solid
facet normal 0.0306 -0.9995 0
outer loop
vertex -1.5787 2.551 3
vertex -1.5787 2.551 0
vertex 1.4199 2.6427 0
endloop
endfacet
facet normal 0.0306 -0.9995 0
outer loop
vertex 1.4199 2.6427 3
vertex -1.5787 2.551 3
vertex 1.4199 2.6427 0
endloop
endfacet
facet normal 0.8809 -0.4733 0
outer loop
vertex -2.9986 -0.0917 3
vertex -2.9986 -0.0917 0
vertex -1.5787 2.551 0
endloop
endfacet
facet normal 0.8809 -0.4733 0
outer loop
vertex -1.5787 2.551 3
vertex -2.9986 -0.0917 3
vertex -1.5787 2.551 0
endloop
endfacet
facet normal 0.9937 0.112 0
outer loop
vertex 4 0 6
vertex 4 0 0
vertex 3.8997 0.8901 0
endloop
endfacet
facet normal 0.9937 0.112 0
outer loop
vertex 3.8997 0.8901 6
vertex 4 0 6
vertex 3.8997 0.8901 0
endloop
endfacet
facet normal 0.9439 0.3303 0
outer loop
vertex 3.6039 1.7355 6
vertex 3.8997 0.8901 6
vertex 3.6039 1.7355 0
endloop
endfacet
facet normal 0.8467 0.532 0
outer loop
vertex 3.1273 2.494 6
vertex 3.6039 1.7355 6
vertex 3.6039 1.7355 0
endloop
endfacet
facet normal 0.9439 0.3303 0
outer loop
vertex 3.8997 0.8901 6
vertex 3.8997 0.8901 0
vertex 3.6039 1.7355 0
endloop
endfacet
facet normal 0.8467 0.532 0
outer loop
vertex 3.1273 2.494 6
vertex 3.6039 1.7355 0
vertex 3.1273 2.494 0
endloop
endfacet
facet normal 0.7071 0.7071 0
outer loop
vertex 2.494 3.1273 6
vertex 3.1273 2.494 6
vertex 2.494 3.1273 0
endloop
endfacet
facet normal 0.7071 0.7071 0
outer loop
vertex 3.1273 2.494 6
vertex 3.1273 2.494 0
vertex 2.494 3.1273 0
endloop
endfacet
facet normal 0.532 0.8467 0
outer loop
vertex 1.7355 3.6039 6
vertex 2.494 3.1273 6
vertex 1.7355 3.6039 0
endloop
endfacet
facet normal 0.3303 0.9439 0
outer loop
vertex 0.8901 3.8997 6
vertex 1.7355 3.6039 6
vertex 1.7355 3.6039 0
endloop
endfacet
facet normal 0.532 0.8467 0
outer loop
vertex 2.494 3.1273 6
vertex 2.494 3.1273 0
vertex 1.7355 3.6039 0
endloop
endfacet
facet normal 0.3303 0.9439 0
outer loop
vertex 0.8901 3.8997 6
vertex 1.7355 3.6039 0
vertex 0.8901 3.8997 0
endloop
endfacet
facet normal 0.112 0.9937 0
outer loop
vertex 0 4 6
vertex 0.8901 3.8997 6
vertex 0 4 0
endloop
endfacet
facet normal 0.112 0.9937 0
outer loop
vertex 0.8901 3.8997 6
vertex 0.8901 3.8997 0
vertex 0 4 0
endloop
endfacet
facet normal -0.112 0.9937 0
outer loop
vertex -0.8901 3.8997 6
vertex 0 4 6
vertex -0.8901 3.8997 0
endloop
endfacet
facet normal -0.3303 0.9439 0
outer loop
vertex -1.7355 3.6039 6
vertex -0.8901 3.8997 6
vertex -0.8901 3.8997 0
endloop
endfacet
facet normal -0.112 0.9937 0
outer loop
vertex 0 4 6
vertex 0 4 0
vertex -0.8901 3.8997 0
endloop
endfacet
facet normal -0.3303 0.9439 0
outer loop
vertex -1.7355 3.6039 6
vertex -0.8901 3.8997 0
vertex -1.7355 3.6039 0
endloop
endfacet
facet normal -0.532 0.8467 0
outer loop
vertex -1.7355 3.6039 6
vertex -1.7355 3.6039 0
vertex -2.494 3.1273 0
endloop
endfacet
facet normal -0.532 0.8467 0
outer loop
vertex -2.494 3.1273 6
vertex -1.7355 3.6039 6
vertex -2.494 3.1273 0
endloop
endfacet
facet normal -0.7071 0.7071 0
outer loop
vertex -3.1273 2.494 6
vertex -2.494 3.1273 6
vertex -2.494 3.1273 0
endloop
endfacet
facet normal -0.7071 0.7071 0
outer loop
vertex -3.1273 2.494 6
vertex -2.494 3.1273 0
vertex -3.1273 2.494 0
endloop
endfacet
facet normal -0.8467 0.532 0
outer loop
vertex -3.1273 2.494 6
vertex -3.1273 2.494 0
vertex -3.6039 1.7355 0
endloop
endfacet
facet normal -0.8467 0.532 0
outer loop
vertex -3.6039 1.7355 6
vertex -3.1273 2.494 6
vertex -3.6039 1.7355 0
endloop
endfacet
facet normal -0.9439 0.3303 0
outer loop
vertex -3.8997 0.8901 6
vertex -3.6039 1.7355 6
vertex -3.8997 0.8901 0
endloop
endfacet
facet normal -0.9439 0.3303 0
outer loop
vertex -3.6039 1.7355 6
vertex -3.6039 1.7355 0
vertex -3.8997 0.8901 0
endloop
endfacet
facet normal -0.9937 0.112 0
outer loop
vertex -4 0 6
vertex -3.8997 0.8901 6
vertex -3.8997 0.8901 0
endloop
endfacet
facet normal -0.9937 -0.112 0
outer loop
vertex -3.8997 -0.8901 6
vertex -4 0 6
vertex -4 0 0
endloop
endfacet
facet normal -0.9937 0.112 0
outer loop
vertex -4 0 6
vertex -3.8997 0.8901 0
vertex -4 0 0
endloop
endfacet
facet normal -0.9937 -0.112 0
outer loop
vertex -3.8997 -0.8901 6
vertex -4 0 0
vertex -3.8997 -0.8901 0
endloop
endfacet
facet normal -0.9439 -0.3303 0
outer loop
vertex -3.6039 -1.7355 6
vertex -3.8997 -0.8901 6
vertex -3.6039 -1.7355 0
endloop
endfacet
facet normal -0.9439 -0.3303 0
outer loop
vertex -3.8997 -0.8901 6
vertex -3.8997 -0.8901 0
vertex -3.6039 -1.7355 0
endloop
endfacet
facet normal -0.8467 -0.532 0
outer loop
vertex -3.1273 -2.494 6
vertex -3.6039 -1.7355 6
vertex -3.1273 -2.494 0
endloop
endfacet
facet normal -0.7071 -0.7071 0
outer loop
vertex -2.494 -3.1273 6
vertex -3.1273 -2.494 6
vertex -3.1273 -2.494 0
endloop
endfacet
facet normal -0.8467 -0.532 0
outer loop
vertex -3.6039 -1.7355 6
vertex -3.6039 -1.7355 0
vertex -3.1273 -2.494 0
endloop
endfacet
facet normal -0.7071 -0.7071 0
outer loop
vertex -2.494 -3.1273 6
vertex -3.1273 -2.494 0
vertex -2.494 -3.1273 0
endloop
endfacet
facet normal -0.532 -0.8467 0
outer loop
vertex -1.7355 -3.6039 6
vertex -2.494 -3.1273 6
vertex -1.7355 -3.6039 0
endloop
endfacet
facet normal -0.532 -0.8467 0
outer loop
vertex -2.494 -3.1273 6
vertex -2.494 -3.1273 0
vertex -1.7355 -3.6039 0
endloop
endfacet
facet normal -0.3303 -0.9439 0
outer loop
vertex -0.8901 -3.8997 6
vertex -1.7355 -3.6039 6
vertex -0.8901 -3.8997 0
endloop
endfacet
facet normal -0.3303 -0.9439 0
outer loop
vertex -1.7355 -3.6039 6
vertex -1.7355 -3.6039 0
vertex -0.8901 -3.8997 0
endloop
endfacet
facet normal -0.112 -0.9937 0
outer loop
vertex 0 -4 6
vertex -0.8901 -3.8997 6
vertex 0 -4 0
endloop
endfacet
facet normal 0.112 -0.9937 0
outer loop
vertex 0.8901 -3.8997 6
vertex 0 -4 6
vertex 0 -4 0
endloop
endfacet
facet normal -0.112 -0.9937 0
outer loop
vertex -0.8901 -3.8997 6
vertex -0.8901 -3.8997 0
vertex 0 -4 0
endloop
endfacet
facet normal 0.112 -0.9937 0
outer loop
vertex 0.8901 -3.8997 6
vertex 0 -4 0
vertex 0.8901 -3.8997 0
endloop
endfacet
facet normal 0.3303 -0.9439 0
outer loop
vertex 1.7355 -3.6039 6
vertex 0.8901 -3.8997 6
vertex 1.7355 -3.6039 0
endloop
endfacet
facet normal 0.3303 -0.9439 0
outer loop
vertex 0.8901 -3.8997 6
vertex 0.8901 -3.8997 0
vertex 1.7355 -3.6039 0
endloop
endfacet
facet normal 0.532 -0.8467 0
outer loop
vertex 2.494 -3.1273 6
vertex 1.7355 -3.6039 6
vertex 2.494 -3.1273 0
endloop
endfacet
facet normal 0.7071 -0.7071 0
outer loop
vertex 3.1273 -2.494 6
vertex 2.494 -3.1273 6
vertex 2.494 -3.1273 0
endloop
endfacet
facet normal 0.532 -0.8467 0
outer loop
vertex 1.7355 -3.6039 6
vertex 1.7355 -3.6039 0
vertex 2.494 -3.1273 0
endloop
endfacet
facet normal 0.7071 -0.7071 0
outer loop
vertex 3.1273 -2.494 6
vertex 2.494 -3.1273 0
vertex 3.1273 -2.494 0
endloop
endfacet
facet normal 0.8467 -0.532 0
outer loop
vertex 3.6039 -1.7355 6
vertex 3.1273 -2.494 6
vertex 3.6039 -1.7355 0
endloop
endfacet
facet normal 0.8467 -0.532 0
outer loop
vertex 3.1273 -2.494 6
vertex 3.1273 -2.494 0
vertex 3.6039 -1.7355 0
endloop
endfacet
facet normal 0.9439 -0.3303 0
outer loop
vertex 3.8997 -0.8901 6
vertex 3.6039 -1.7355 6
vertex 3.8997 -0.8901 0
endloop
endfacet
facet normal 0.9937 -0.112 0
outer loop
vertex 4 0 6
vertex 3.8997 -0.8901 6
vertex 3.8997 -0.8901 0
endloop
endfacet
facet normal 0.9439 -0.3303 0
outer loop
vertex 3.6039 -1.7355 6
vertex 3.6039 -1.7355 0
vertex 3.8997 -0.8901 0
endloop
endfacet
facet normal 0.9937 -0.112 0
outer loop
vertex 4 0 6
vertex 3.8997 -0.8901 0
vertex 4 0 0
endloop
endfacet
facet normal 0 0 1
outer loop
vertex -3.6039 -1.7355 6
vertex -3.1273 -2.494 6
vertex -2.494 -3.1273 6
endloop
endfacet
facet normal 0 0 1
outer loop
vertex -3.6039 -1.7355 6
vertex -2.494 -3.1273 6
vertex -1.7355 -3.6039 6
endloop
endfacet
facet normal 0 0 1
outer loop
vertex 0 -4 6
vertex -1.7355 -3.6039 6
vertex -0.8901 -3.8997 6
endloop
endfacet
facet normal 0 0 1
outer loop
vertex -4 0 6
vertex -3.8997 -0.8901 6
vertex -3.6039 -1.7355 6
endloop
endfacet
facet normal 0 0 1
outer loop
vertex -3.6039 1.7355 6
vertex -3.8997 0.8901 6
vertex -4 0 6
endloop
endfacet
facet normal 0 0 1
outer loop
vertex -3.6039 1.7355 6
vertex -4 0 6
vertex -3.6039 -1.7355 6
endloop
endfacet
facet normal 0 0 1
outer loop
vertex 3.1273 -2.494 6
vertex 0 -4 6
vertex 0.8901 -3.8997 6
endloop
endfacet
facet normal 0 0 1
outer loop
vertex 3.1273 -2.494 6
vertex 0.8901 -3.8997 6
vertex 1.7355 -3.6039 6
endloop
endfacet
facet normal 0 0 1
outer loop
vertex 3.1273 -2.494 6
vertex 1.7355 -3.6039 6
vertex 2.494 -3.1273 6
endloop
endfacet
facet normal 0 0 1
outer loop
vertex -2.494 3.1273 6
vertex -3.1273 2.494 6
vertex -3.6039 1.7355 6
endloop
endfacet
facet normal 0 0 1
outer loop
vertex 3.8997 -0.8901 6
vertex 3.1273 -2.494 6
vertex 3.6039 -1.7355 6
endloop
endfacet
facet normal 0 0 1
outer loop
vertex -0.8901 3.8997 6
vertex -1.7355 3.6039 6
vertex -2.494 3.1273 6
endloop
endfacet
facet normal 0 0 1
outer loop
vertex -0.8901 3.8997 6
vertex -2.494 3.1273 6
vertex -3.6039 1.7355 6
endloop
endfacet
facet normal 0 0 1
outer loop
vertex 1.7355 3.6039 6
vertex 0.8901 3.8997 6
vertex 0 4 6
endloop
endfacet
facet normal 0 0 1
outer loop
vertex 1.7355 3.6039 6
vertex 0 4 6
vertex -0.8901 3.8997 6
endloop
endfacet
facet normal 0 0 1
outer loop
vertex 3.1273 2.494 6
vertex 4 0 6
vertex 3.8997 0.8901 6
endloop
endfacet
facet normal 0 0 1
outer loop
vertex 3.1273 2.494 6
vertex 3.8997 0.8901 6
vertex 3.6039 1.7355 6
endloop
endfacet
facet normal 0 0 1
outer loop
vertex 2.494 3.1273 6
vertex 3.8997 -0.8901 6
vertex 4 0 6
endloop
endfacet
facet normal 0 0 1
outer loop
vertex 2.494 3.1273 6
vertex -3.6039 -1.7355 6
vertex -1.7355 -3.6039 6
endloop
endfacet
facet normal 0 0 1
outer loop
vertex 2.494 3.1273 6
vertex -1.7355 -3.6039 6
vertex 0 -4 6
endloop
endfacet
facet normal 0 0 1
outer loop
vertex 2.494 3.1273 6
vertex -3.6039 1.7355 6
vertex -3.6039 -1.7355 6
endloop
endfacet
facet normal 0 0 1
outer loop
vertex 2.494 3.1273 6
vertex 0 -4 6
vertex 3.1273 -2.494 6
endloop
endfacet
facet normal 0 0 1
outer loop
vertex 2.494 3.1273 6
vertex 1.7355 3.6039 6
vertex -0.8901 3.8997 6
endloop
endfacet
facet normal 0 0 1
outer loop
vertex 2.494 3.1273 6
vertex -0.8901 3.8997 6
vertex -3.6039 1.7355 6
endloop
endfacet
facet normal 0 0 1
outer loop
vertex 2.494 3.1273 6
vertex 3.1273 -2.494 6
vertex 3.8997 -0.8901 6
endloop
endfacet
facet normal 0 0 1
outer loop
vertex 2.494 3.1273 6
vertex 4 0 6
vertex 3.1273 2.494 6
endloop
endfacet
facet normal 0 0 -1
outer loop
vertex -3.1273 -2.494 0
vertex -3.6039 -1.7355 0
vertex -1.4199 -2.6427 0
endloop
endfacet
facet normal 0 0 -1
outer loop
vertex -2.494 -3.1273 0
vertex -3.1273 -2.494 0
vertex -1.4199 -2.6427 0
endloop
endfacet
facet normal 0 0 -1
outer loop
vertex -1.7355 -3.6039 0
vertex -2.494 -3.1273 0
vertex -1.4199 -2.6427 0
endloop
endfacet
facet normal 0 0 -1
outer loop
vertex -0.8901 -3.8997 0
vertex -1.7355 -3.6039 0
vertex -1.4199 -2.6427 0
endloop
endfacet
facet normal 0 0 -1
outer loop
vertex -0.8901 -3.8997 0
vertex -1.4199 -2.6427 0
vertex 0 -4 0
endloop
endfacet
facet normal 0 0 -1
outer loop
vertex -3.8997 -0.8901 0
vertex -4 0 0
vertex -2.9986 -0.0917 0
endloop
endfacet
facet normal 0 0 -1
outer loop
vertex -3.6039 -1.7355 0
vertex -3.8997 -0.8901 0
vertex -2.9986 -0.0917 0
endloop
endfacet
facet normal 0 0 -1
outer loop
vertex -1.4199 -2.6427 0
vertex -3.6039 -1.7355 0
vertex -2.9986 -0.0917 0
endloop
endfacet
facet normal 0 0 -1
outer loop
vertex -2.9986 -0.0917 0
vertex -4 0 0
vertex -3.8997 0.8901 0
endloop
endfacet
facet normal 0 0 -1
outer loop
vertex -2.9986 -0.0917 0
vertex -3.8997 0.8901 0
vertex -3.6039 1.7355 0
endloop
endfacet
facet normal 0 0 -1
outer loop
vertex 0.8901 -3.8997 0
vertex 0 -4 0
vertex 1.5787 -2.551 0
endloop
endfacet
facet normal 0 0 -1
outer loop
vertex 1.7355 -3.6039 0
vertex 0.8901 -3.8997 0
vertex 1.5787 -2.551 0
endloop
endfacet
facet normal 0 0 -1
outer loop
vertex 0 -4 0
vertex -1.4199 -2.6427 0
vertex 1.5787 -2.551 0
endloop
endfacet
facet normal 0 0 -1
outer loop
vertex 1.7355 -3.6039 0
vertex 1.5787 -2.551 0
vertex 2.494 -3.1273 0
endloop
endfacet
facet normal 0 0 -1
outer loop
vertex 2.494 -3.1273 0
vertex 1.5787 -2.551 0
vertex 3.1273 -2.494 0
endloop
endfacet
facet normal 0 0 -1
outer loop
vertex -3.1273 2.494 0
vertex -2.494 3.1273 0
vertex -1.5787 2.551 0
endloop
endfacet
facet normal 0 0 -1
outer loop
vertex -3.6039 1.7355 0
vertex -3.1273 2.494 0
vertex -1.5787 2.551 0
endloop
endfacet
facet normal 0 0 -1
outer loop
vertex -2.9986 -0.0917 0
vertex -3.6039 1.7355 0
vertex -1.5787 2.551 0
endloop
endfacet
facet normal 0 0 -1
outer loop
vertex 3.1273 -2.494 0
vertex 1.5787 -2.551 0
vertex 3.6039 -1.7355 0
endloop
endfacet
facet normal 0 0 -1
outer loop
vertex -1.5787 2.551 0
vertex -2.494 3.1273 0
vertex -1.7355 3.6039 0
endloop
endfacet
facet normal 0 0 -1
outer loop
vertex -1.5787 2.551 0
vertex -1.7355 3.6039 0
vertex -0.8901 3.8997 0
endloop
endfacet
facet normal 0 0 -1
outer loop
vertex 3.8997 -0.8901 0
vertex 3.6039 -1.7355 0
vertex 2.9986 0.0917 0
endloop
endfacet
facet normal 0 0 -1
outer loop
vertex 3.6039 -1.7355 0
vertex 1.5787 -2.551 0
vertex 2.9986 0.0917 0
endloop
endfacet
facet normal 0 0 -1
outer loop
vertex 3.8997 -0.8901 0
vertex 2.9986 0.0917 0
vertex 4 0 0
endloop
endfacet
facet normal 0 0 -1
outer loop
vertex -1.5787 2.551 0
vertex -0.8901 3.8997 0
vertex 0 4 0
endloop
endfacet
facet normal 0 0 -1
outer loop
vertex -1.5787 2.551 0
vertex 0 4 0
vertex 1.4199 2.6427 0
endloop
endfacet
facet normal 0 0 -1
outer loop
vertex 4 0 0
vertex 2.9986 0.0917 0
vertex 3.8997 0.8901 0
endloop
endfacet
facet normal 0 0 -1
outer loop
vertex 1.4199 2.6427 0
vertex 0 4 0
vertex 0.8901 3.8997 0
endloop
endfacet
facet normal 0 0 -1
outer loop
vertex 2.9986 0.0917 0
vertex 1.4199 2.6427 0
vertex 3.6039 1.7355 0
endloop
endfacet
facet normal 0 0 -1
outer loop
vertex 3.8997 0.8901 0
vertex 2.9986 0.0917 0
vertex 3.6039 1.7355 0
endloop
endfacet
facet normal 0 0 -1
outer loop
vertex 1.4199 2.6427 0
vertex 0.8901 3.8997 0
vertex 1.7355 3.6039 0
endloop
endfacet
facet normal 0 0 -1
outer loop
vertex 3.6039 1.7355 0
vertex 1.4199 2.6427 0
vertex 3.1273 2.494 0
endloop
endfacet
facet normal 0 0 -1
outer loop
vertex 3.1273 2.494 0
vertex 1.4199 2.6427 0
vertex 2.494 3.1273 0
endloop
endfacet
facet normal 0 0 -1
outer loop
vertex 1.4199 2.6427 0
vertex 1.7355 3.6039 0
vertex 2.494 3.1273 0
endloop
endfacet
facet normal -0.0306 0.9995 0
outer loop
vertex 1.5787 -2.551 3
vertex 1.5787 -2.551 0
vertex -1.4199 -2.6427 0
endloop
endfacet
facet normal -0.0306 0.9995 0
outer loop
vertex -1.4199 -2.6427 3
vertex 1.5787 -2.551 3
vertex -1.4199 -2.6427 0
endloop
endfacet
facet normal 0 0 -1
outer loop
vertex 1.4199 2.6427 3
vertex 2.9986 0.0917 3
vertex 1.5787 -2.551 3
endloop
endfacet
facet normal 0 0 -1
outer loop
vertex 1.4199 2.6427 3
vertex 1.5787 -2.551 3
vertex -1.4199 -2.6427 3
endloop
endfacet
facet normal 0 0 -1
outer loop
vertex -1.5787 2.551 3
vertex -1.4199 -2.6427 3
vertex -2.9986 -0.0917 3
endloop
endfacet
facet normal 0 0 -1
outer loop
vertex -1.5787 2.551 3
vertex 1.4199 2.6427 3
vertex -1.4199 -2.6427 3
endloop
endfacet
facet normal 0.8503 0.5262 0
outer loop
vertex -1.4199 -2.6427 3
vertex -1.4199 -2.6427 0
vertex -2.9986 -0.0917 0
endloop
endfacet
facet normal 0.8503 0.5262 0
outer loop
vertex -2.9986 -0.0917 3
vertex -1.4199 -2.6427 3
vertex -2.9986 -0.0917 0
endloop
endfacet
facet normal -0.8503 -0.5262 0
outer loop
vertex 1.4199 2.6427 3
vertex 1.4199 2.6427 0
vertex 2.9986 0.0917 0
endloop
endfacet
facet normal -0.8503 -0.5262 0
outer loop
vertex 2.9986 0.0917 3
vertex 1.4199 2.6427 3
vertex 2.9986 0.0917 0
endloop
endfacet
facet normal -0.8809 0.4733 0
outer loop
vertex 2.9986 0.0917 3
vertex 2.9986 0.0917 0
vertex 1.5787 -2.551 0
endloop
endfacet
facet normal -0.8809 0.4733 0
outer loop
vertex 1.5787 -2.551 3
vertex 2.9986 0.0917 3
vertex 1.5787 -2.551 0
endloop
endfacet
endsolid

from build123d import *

# Parameters (mm, degrees)
SKETCH_1_R          = 4
EXTRUDE_1_DEPTH     = 6
CUT_EXTRUDE_1_DEPTH = 3


with BuildPart() as part:
    # 草图1 → 凸台-拉伸1 (new body)
    with BuildSketch(Plane.XY):
        Circle(SKETCH_1_R)
    extrude(amount=EXTRUDE_1_DEPTH)

    # 草图3 → 切除-拉伸1 (cut)
    with BuildSketch(Plane(origin=(0, 0, 0), x_dir=(-1, 0, 0), z_dir=(0, 0, -1))):
        Polygon((2.998599074, -0.091671127), (1.578689062, 2.55102741), (-1.419910012, 2.642698537), (-2.998599074, 0.091671127), (-1.578689062, -2.55102741), (1.419910012, -2.642698537), align=None)
    extrude(amount=-CUT_EXTRUDE_1_DEPTH, mode=Mode.SUBTRACT)


solid = part.part
